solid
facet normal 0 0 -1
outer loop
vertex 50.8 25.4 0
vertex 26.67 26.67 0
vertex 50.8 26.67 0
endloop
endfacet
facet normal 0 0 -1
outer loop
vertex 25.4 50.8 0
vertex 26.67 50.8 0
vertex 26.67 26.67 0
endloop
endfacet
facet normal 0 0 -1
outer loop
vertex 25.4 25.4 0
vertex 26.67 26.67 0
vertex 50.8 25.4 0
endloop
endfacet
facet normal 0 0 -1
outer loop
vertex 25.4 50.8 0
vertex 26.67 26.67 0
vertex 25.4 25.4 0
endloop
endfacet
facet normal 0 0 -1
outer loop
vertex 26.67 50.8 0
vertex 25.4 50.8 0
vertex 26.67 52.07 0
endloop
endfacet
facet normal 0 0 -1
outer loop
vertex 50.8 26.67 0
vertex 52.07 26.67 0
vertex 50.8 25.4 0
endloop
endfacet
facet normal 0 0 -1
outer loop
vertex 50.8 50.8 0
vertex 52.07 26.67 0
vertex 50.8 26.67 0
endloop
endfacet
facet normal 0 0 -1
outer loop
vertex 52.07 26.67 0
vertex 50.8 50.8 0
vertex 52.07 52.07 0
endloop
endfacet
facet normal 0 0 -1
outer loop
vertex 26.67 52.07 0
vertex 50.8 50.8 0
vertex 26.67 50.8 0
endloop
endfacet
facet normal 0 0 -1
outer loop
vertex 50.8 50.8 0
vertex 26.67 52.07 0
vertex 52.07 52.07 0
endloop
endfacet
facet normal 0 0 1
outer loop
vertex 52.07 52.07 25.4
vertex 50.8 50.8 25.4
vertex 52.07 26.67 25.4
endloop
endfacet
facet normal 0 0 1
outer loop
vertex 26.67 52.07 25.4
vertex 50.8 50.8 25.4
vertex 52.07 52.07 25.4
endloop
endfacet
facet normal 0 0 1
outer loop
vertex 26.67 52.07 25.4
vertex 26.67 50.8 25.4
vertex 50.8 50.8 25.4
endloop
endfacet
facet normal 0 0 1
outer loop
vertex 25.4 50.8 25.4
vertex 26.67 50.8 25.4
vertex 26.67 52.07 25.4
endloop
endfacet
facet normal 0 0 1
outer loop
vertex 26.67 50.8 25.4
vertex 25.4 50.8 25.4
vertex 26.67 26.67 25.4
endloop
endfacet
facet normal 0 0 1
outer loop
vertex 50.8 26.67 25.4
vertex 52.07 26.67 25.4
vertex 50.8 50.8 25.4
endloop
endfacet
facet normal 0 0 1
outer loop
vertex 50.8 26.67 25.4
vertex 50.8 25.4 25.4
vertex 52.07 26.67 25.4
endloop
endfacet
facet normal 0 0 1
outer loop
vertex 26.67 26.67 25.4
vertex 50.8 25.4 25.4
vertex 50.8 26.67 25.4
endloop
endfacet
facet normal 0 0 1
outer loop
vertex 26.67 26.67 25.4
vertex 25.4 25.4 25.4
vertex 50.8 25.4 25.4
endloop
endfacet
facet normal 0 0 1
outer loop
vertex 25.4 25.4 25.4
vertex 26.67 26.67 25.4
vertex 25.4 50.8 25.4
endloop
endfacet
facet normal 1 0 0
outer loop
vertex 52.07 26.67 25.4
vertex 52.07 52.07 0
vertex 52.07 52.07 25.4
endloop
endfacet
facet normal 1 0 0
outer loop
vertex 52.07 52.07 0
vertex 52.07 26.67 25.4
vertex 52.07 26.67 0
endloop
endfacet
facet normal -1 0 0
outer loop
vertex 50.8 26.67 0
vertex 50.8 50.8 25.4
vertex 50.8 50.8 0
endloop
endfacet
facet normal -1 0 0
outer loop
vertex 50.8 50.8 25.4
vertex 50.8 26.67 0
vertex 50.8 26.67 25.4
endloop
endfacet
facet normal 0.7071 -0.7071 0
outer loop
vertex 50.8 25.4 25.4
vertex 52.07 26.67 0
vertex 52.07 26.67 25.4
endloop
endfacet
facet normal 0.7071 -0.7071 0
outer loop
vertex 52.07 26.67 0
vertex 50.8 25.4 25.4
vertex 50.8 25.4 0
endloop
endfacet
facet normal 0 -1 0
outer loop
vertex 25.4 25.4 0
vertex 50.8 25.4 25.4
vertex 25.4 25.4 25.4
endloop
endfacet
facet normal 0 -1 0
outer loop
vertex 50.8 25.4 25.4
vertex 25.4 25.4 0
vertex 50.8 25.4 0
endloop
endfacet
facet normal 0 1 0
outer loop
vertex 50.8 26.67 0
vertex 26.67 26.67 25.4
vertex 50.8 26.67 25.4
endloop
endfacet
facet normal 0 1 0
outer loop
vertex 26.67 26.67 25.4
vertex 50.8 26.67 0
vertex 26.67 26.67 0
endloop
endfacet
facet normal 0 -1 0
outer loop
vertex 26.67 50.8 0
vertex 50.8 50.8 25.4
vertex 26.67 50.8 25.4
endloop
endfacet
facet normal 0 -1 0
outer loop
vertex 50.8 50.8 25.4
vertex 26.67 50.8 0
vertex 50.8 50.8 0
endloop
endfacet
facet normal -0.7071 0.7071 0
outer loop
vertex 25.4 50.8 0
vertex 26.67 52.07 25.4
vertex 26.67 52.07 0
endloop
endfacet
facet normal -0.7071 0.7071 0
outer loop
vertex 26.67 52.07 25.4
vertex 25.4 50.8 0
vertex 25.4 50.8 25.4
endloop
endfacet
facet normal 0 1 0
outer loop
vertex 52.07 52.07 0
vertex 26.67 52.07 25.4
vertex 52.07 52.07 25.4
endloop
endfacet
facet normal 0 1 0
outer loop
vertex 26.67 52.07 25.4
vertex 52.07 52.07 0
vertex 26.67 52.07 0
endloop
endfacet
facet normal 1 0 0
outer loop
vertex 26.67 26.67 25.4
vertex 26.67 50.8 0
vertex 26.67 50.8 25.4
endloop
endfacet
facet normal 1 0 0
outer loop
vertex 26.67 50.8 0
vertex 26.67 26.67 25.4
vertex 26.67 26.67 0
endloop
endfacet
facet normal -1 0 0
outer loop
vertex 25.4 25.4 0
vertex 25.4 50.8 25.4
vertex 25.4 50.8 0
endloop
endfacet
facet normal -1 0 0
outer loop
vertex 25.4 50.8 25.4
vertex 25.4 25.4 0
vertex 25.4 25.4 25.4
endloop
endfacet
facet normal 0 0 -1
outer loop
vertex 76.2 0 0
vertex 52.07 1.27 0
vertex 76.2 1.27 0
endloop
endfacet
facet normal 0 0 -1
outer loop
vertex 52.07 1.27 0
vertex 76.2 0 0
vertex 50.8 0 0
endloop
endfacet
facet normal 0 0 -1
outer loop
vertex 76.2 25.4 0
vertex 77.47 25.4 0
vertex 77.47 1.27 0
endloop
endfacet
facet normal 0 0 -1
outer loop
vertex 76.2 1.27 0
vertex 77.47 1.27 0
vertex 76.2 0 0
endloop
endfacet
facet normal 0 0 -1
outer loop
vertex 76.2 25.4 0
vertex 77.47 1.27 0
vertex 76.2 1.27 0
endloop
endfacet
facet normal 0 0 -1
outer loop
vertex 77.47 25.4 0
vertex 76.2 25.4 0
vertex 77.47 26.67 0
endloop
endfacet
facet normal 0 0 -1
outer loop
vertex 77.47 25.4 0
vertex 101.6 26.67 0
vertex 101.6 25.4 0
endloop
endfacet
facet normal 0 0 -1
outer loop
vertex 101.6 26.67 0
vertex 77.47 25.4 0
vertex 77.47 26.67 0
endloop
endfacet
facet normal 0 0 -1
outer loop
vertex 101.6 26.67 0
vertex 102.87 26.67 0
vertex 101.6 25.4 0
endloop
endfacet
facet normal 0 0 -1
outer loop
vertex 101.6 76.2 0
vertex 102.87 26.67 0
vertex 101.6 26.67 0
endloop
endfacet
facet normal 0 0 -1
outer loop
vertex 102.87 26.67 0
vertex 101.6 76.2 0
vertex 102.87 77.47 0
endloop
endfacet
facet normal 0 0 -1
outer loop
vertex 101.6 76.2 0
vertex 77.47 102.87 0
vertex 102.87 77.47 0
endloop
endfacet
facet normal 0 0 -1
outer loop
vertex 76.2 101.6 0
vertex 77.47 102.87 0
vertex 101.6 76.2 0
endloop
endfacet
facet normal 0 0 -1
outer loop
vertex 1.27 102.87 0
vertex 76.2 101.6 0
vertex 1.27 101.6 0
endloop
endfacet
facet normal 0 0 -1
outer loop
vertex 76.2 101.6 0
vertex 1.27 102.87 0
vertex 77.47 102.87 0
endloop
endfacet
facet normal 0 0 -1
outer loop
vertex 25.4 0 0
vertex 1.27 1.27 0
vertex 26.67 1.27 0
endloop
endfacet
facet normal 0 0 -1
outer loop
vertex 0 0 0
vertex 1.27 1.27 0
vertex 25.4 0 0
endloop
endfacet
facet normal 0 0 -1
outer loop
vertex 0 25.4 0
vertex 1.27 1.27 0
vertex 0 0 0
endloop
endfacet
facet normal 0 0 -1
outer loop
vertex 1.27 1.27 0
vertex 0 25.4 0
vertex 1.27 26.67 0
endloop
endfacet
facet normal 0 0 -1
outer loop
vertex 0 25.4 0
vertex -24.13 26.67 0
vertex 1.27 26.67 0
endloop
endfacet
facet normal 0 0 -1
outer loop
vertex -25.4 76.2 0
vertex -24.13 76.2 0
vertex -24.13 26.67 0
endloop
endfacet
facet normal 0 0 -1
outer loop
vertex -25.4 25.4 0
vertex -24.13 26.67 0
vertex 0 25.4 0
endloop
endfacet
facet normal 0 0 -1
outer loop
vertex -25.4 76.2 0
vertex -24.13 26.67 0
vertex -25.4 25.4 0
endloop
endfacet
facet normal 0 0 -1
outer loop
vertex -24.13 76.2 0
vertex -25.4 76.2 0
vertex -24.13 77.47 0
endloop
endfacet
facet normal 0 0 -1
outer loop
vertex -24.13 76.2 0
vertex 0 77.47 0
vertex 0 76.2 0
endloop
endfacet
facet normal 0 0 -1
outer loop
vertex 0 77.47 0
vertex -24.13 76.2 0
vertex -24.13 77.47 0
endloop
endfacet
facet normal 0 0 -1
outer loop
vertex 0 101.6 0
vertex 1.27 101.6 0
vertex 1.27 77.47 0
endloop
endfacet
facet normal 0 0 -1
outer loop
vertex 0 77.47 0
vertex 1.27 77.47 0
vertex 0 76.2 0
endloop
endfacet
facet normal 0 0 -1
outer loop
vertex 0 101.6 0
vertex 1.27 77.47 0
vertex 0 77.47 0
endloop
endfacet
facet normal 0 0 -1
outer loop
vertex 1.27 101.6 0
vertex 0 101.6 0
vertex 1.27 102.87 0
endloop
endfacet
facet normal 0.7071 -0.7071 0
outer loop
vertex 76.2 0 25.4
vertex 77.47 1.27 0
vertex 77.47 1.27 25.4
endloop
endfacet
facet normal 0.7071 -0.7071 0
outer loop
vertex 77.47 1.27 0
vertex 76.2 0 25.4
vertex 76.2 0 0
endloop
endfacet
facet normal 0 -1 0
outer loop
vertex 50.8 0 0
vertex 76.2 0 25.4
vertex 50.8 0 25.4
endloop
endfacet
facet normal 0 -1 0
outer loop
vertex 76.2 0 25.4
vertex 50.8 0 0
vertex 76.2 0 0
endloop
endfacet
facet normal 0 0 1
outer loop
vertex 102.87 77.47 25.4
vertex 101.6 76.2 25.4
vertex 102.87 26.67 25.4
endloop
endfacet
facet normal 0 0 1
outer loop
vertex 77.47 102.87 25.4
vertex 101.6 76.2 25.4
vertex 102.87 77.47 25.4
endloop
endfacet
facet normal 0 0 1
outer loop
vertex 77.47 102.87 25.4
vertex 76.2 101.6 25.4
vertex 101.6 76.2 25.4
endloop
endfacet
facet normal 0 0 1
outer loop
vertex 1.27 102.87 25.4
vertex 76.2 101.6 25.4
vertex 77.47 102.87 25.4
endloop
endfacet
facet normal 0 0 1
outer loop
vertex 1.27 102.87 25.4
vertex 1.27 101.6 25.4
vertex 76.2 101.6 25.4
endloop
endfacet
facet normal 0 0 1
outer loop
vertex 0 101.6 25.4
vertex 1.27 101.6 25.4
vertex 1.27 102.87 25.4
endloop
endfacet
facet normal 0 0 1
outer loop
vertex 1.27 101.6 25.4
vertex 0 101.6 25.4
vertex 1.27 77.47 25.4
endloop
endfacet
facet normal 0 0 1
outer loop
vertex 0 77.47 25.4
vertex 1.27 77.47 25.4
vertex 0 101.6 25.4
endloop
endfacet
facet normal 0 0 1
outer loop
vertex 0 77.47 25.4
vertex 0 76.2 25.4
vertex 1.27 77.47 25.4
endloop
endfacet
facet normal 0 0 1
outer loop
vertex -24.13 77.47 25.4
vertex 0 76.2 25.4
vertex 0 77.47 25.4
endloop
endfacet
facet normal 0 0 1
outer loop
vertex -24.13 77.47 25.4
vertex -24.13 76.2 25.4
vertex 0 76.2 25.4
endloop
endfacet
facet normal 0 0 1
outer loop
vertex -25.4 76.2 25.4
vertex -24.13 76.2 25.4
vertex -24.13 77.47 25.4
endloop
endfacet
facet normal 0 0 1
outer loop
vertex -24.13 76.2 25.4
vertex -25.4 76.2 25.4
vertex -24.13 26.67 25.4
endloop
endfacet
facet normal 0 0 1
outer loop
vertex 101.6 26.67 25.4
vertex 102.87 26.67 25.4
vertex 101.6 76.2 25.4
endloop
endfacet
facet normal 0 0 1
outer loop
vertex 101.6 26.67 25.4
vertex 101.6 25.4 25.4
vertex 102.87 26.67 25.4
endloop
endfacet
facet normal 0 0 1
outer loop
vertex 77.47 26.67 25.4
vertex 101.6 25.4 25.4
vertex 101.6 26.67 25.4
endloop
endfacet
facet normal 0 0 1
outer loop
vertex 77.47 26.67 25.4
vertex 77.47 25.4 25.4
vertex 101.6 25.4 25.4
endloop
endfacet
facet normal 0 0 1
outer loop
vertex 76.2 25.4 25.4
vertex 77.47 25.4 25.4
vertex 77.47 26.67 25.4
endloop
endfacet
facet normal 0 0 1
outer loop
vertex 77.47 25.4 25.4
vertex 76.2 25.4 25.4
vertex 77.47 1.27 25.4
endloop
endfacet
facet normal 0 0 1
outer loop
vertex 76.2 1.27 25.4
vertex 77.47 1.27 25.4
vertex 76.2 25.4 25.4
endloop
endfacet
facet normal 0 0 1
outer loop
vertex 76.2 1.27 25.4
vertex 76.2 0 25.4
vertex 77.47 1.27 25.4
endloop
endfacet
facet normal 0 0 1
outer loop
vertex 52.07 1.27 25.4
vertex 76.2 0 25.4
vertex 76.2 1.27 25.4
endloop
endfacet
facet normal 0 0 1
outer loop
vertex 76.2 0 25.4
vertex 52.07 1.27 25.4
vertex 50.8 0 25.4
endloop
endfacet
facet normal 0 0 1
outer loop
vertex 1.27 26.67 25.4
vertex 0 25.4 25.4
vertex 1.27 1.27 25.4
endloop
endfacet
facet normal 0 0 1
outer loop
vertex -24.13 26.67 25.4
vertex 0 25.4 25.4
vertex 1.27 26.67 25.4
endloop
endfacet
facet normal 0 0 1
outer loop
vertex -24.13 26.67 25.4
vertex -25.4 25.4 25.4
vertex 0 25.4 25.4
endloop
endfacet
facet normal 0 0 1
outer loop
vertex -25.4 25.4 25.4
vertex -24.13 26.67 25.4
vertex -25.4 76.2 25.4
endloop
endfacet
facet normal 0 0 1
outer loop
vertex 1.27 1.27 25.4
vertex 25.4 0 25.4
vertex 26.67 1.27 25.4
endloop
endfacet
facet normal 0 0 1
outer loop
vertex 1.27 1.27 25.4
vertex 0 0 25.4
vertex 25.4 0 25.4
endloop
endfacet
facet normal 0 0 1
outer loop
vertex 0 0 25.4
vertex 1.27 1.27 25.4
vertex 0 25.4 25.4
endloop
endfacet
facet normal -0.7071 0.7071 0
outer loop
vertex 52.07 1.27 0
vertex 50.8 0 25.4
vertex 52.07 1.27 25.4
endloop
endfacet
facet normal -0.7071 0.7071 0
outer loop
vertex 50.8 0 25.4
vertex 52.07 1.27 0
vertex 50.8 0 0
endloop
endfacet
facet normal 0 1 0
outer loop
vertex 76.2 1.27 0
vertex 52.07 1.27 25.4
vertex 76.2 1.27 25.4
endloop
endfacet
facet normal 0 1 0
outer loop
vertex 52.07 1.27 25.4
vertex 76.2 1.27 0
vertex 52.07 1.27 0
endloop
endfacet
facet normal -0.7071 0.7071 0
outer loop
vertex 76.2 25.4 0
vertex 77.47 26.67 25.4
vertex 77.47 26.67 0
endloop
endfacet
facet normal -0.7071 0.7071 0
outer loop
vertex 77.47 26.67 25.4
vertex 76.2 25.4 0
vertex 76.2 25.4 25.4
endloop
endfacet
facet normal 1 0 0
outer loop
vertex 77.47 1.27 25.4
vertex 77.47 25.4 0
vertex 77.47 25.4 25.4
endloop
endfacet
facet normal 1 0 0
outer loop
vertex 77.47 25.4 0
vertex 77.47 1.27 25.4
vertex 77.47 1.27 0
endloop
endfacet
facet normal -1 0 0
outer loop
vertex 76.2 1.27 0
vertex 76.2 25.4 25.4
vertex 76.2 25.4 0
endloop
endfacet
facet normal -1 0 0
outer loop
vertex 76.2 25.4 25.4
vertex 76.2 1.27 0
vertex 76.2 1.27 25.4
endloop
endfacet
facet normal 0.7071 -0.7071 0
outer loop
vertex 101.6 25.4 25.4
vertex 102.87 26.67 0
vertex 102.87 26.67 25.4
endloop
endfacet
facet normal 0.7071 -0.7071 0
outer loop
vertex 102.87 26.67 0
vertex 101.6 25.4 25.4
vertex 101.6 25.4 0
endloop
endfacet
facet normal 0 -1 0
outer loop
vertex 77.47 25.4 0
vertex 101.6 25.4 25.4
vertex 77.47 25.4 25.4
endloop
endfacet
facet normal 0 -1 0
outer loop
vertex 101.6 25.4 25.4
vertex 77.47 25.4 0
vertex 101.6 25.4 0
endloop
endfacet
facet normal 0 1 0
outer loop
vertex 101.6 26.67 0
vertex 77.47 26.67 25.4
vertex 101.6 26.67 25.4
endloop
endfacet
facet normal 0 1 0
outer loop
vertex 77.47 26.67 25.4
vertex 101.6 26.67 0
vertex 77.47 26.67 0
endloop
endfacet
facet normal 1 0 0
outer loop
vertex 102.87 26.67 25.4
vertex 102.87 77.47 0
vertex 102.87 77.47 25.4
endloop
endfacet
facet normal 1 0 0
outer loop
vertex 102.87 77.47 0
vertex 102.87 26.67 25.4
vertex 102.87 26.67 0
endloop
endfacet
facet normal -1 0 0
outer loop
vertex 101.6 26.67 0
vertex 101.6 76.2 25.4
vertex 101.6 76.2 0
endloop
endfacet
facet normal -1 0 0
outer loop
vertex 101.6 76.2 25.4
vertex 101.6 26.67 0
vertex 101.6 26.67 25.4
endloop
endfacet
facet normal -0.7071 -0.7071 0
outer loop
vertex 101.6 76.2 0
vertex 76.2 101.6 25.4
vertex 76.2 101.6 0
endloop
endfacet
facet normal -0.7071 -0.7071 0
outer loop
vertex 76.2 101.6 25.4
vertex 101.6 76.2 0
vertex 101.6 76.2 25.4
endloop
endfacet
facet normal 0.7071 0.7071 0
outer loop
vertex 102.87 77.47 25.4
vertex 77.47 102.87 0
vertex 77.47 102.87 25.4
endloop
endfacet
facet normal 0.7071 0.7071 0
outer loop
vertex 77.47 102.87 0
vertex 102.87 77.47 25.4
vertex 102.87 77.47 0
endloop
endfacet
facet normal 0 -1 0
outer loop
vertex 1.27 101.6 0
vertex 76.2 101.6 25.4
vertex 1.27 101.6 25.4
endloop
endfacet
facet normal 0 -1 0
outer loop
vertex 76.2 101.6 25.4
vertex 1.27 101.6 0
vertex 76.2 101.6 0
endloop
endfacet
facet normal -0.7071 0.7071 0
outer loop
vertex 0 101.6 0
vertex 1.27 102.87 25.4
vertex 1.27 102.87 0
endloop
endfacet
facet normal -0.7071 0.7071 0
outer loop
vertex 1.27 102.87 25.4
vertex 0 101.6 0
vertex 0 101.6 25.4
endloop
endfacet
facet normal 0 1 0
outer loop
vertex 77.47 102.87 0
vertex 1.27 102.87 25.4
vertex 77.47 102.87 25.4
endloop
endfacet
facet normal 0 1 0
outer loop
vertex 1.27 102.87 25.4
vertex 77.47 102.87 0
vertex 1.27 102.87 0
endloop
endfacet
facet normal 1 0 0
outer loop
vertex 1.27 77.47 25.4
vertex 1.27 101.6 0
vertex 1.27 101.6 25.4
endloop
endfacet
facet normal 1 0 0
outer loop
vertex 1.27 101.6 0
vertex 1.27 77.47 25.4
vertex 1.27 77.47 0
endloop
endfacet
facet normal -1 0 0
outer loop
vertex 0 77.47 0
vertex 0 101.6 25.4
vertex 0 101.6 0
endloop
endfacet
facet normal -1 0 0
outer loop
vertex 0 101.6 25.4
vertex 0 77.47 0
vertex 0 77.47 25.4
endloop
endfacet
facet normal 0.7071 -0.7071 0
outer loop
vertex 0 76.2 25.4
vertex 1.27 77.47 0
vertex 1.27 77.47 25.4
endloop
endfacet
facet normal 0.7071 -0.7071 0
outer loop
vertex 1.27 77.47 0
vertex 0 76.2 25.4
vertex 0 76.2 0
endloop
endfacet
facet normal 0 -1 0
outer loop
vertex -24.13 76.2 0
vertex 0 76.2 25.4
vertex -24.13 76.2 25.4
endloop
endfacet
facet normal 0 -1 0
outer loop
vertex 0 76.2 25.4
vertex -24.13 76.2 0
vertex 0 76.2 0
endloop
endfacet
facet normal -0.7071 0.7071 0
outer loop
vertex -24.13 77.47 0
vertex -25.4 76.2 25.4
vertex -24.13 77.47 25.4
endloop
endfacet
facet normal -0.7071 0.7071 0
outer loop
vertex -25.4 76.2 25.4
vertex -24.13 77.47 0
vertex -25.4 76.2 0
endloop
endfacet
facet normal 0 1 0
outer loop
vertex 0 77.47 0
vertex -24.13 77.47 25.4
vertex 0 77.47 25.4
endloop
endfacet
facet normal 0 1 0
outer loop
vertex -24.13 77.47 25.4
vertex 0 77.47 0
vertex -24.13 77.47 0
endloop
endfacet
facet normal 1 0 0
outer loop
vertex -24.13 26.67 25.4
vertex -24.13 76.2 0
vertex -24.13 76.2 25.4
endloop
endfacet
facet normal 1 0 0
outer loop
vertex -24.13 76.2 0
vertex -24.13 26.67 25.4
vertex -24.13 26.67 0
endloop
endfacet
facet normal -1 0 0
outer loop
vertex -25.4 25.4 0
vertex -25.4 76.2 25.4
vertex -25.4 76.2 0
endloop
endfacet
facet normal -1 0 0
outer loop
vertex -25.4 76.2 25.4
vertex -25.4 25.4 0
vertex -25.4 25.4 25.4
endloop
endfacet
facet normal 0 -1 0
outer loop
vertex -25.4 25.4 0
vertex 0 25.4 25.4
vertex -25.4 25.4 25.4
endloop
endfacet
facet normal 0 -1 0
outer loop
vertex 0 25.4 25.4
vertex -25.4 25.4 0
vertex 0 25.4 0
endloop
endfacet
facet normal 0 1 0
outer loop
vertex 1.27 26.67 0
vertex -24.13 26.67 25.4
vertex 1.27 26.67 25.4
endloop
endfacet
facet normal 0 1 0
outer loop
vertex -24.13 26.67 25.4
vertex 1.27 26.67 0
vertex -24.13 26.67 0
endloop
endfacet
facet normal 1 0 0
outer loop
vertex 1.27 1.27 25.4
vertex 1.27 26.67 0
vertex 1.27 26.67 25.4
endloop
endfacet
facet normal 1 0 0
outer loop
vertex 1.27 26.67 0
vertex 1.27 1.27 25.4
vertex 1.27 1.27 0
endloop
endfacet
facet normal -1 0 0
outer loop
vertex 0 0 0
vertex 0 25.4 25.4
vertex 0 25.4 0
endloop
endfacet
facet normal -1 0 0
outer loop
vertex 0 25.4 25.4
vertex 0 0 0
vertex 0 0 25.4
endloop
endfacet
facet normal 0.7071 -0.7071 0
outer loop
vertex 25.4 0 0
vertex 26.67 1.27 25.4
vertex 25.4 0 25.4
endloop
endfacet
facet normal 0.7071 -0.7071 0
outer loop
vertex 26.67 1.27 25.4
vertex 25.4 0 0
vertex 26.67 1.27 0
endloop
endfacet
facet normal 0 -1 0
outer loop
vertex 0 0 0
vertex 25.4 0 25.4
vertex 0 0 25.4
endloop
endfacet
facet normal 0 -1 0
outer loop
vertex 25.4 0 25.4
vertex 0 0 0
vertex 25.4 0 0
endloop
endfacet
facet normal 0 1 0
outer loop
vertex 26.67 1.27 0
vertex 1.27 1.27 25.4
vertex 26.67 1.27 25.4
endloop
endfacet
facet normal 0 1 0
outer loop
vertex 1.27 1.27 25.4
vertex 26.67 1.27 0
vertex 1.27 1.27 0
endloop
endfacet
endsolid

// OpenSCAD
//CUSTOMIZER VARIABLES

//	This should be a small number relative to your height of wall
width_Of_wall = .05;

//How tall do you want this
height_Of_wall = 1;

//	Vector path of wall, (wall thickness is only right angles for now), to generate a seperate path make a null/blank entry in your vector of order pairs, please note these are in whatever unit you selected earlier.
cords_Of_wall = [[1,0],[0,0],[0,1],[-1,1],[-1,3],[0,3],[0,4],[3,4],[4,3],[4,1],[3,1],[3,0],[2,0],[,],[1,1],[1,2],[2,2],[2,1],[1,1]];

//Basically are you using american units or real units
units_entered = 25.4;//[1:mm, 10:cm, 1000:meter, 25.4:inch, 304.8:foot]

//default is mm for most printers
desired_units_for_output = 1;//[1:mm, .1:cm, 0.001:meter, 0.0393701:inch, 0.00328084:foot]

//	This option will not appear because of the *1
//CUSTOMIZER VARIABLES END

width_of_wall = width_Of_wall;
unit_conversion_factor = units_entered*desired_units_for_output;
height_of_wall = height_Of_wall*unit_conversion_factor;

module make_wall_segments(cords = cords_Of_wall, number_your_on,units = 25.4) {
	/*number_your_on works such that when it equals 1, that is the begining.
		(yes I am one of those people who belives arrays 
		should have started with 1 instead of 0)
	*/
	point1 = cords[number_your_on-1]*unit_conversion_factor;
	point2 = cords[number_your_on]*unit_conversion_factor;
	point3 = [point2[0]+width_Of_wall*unit_conversion_factor,point2[1]+width_Of_wall*unit_conversion_factor];
	point4 = [point1[0]+width_Of_wall*unit_conversion_factor,point1[1]+width_Of_wall*unit_conversion_factor];
	
	linear_extrude(height = height_of_wall){
			polygon([point1,point2,point3,point4]);
		}
		if(number_your_on < len(cords)){
			make_wall_segments(cords = cords_Of_wall,number_your_on = number_your_on+1, units = unit_conversion_factor);
		}
}

make_wall_segments(cords = cords_Of_wall,number_your_on = 1, units = unit_conversion_factor);
